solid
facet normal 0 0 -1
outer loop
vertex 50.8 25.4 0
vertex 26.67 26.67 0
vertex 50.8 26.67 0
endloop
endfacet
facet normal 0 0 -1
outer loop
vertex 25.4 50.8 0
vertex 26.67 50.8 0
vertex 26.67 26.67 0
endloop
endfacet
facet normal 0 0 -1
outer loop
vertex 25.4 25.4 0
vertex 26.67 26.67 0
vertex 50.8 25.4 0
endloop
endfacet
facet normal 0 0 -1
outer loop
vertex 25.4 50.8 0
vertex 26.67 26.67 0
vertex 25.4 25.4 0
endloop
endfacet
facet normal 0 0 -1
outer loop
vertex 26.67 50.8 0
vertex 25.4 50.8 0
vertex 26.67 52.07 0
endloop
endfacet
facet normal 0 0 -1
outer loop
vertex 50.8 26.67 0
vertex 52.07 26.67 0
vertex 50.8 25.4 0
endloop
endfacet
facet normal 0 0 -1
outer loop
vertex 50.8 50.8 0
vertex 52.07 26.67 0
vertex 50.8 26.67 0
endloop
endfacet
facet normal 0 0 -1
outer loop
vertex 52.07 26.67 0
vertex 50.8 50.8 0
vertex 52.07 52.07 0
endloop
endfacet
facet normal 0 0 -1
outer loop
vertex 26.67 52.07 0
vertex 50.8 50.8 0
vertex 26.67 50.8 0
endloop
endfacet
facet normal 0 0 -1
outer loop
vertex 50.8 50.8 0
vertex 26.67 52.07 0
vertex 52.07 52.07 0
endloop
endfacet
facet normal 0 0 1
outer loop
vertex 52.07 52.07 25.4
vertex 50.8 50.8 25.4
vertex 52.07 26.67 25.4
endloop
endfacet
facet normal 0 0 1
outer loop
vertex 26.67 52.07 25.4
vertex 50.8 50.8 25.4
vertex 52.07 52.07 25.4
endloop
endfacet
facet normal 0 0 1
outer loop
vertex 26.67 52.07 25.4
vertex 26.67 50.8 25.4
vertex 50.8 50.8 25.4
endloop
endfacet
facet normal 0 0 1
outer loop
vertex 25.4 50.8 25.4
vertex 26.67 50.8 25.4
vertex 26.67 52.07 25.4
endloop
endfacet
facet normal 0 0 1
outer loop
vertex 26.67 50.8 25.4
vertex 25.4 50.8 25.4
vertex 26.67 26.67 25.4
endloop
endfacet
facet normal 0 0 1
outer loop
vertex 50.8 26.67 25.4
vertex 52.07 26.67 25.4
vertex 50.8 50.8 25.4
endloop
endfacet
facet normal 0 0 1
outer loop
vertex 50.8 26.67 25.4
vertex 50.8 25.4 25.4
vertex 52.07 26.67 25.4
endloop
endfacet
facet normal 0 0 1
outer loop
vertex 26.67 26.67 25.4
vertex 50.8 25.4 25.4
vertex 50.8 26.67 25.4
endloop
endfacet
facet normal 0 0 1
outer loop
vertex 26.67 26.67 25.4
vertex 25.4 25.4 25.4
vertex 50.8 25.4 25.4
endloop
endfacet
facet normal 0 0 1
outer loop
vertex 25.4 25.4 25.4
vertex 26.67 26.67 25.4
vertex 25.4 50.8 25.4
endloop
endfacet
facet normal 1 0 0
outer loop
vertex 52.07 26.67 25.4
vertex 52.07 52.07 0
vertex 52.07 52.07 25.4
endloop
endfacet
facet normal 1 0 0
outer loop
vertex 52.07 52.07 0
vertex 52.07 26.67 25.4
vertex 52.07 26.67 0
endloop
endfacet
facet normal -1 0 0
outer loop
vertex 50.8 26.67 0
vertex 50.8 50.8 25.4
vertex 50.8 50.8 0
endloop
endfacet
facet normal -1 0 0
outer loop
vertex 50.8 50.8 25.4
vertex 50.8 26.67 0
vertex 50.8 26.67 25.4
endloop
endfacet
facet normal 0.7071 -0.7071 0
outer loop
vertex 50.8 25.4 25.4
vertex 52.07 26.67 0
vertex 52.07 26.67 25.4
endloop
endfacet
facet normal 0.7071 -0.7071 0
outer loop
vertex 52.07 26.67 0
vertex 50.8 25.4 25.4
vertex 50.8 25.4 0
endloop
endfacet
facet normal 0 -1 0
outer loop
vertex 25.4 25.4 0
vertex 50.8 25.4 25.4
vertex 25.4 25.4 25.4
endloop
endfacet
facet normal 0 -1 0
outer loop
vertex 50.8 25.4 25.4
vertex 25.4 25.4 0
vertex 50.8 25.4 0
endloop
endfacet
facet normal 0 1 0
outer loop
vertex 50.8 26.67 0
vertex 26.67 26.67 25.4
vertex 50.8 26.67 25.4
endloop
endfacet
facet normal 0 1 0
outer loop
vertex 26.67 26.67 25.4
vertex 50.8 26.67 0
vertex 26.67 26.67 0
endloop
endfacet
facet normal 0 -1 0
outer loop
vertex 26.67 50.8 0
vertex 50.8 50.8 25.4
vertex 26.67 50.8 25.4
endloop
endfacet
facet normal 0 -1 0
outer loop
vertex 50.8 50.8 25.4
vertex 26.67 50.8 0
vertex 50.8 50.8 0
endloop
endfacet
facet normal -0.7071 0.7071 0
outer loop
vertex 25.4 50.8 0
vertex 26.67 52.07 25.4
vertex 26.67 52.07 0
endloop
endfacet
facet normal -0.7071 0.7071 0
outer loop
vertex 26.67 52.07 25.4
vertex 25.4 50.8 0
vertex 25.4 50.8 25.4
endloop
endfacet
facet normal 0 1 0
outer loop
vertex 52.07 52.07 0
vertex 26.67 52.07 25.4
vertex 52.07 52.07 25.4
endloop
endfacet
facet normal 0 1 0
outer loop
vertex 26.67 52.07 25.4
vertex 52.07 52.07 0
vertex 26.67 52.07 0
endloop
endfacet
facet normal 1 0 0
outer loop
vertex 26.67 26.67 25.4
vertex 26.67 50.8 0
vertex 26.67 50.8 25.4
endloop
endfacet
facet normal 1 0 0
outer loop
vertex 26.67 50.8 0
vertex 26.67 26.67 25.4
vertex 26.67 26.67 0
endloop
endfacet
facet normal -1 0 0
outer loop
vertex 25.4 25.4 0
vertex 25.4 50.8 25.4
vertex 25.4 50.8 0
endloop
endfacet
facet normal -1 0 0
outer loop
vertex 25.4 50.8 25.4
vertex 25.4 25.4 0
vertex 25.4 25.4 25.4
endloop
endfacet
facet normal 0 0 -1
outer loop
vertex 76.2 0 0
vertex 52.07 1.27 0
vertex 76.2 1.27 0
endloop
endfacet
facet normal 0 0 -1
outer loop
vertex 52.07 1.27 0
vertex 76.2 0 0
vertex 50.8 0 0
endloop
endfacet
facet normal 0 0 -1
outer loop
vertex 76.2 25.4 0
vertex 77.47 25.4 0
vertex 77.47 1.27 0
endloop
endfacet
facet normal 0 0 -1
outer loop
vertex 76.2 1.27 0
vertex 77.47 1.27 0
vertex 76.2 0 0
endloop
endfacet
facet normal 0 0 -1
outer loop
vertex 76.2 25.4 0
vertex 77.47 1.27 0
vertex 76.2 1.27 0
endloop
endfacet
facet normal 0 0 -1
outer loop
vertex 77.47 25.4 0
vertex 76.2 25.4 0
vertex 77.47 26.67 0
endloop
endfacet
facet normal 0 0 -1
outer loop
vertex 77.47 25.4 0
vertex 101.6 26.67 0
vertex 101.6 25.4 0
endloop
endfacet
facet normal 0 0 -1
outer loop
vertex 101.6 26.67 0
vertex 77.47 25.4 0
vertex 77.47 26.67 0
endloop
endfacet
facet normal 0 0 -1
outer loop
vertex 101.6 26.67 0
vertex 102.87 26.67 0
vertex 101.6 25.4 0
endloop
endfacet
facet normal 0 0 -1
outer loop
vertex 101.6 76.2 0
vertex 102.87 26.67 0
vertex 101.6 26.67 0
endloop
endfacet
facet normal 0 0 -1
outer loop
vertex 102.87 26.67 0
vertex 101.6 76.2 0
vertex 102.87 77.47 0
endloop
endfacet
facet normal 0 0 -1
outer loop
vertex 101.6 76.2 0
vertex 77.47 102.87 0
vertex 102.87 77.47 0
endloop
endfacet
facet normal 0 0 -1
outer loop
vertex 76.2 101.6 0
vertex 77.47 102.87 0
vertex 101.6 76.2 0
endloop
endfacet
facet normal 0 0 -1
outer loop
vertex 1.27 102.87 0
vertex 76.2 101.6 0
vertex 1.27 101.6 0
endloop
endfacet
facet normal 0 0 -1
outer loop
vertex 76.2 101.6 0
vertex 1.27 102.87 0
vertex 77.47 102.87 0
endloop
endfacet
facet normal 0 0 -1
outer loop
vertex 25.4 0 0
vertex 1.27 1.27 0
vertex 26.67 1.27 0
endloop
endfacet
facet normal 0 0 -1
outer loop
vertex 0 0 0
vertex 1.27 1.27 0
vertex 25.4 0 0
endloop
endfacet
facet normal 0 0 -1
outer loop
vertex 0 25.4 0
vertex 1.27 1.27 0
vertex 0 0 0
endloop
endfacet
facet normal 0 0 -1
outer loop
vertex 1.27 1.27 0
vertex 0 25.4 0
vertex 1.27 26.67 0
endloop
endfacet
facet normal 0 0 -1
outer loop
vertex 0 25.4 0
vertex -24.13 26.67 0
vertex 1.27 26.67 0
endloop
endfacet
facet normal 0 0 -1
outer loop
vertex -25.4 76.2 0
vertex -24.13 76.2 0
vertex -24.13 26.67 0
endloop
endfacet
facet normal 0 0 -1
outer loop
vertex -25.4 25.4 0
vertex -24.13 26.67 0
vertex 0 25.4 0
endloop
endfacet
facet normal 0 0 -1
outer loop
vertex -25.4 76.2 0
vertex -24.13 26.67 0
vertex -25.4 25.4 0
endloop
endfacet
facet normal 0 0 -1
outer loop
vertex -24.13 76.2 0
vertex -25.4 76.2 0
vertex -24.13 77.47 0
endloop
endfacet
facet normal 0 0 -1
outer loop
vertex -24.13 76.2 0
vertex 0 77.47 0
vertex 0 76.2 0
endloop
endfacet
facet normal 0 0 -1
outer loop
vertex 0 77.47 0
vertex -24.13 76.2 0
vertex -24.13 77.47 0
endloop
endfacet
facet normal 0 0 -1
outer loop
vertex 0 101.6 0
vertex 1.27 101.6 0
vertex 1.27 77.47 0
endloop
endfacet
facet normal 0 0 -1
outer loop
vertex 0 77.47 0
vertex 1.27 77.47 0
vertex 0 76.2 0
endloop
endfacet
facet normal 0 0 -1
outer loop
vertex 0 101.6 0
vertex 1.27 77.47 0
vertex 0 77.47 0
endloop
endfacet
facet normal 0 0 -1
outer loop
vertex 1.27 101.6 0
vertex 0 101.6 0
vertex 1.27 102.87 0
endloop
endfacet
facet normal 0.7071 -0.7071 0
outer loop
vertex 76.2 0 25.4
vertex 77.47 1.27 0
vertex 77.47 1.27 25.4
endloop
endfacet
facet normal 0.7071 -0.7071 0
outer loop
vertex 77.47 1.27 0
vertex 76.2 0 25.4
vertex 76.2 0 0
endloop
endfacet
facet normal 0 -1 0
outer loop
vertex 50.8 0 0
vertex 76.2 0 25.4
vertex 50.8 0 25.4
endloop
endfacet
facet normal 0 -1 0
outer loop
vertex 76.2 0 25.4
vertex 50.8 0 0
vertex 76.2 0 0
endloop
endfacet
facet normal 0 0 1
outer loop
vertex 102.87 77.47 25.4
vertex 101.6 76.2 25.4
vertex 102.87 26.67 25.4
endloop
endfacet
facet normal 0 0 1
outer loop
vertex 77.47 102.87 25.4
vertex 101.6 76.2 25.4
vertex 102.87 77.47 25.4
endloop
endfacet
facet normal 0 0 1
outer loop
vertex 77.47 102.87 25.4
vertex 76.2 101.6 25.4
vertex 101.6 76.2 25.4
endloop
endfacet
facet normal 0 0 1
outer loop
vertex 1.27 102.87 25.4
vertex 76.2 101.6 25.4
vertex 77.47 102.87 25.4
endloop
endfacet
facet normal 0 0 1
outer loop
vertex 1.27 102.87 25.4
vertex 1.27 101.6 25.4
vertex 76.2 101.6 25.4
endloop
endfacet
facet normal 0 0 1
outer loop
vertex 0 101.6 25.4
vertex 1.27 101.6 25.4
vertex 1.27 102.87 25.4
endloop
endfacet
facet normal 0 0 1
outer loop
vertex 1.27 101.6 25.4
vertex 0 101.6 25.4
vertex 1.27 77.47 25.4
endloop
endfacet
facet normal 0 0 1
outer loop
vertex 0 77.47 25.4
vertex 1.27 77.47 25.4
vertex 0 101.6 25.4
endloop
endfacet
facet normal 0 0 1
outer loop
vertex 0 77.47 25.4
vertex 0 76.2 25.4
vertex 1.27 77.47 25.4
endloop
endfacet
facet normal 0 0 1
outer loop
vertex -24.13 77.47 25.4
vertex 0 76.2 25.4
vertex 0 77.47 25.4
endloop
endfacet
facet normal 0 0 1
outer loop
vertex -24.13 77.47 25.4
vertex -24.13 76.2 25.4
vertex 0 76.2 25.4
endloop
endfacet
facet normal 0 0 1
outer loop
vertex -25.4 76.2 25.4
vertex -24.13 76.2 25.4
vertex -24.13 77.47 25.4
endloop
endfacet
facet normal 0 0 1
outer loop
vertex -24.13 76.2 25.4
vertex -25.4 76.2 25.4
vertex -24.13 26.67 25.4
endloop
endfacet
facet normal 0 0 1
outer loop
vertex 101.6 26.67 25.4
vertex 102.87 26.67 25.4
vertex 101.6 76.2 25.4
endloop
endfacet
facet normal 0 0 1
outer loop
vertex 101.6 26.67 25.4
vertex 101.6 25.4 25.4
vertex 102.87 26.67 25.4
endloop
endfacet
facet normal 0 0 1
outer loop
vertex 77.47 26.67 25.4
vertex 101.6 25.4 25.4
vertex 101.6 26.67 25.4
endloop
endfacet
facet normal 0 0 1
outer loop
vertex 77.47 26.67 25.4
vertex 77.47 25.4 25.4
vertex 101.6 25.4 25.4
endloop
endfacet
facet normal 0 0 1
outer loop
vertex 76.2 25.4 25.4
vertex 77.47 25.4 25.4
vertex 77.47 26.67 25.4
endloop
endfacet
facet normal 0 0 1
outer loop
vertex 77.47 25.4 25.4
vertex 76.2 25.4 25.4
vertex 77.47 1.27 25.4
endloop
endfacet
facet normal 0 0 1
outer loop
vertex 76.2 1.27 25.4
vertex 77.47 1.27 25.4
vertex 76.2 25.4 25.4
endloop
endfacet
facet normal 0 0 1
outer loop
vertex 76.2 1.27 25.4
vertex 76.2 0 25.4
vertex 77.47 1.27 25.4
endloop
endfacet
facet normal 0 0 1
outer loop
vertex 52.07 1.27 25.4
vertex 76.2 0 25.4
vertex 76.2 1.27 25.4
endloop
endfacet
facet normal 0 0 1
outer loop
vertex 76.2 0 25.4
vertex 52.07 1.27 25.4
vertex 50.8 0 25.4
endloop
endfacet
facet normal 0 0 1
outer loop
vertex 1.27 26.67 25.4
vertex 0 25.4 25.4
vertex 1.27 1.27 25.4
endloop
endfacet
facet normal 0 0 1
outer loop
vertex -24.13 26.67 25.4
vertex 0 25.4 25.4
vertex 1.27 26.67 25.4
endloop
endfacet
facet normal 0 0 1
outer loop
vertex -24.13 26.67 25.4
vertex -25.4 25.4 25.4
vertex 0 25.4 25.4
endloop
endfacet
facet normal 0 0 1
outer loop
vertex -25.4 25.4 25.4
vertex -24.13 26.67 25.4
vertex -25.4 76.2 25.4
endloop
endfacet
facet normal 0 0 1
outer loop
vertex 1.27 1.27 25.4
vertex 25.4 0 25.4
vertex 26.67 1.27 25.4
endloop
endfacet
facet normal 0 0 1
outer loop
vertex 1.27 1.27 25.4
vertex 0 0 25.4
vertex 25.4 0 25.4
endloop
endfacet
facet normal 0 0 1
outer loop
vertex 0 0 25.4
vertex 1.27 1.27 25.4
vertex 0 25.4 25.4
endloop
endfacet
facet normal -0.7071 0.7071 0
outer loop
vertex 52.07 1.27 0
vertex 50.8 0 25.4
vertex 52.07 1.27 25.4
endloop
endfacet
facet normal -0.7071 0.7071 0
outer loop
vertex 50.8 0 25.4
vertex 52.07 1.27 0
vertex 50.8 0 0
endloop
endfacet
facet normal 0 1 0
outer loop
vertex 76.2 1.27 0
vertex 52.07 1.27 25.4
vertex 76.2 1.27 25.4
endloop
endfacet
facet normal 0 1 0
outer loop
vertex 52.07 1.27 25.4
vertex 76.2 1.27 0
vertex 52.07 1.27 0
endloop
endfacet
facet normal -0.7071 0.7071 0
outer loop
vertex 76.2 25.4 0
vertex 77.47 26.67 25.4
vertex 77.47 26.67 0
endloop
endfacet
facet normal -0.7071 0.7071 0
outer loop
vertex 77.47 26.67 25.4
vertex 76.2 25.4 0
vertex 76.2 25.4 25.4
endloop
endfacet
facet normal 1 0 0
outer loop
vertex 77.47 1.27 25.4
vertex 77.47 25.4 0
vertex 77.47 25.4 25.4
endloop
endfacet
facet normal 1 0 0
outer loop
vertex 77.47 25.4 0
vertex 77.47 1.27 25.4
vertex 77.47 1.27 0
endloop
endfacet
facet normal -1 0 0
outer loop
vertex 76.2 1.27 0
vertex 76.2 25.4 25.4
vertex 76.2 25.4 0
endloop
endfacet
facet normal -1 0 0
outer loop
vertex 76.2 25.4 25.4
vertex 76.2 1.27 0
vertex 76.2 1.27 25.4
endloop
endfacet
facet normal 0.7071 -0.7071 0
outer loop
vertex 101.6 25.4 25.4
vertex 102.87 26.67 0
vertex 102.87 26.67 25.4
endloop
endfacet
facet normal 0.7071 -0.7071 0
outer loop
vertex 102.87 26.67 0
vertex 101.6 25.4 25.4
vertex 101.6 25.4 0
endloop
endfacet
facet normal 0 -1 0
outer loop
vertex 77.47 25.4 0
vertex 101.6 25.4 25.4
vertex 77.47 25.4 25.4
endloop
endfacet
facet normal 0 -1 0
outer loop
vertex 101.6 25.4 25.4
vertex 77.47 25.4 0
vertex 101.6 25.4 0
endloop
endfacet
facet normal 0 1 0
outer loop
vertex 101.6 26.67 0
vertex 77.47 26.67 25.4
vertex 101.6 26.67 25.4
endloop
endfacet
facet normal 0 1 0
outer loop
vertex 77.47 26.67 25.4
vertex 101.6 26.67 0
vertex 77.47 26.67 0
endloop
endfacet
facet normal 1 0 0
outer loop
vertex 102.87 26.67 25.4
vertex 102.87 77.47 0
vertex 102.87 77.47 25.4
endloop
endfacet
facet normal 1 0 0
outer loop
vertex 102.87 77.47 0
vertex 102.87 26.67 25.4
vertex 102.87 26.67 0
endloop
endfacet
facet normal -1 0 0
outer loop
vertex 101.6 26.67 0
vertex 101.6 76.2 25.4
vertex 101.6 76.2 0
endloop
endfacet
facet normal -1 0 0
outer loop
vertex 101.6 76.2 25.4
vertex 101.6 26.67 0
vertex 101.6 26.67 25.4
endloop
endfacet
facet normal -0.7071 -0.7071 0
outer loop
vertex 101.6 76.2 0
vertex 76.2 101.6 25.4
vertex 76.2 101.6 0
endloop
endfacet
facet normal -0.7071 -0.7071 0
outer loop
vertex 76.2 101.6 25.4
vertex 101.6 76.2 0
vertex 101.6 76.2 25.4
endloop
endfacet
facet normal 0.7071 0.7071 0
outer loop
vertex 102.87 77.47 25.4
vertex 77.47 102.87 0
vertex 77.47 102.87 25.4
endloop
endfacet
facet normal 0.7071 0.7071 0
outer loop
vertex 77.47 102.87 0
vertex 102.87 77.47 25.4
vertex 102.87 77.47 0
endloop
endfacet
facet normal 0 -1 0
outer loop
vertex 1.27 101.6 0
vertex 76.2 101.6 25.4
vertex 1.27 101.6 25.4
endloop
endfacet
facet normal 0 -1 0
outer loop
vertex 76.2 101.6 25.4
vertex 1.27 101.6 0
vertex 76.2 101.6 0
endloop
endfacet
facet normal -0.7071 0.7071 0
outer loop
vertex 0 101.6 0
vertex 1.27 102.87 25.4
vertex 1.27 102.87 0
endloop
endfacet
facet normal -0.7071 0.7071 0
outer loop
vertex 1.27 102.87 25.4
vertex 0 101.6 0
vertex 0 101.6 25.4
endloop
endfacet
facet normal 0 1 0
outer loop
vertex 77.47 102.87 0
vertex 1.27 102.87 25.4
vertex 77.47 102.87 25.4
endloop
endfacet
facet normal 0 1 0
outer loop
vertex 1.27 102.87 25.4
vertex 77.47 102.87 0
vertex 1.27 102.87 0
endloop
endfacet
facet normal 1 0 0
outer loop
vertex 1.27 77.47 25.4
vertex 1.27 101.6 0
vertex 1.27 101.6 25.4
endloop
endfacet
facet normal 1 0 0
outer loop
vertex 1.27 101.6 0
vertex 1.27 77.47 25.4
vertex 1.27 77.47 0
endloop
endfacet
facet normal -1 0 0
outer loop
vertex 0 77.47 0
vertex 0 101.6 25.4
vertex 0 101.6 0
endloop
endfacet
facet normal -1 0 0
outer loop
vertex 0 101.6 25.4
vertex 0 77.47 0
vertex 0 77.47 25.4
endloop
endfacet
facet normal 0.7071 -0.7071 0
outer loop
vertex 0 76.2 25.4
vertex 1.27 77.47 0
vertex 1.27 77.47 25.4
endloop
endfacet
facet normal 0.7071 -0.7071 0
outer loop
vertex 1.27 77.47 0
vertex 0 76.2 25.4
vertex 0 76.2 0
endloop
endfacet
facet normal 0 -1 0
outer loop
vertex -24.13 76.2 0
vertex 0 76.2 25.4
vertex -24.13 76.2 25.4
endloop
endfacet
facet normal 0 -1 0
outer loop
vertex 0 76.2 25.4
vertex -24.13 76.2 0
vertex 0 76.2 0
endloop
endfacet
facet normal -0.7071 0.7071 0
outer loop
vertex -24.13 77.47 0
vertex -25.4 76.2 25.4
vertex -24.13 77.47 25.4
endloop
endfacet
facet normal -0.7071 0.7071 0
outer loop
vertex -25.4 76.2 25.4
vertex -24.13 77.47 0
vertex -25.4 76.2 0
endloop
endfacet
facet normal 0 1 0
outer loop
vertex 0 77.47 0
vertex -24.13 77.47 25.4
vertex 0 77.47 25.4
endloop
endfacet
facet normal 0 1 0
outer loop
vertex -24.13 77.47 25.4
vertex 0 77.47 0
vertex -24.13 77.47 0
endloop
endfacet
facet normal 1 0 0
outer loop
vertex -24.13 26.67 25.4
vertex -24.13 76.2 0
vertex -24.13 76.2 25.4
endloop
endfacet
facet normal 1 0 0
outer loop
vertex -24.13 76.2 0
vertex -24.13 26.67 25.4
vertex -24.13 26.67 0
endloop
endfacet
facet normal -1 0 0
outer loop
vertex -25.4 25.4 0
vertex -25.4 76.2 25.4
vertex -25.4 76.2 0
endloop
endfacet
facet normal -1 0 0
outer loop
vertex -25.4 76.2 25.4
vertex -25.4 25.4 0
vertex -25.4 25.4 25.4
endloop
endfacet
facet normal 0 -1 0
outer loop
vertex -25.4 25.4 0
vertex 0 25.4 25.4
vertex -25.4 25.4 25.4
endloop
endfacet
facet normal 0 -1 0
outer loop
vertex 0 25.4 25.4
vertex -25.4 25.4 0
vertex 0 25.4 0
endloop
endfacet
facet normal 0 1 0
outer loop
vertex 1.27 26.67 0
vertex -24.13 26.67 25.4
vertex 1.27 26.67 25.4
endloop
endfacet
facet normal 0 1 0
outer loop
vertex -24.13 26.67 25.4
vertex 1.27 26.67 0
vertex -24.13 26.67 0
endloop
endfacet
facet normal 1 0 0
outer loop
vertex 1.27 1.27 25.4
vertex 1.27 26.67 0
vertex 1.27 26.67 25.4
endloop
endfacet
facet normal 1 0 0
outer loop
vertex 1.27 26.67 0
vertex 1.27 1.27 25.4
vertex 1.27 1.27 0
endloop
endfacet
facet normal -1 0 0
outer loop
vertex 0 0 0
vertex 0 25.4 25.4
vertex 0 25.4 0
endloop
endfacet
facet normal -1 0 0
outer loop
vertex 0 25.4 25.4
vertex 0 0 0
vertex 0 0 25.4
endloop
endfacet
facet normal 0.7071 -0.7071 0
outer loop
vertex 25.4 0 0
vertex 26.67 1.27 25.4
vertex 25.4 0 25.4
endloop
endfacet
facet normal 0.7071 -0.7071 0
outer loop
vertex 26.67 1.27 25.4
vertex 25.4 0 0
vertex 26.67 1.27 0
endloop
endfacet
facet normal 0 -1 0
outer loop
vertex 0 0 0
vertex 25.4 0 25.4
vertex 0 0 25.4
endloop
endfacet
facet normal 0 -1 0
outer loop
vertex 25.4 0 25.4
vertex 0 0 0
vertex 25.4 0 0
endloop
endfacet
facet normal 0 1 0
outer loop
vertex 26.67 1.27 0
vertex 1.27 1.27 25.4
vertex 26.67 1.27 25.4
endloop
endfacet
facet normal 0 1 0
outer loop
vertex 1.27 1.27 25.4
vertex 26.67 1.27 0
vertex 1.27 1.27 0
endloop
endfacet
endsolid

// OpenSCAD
//CUSTOMIZER VARIABLES

//	This should be a small number relative to your height of wall
width_Of_wall = .05;

//How tall do you want this
height_Of_wall = 1;

//	Vector path of wall, (wall thickness is only right angles for now), to generate a seperate path make a null/blank entry in your vector of order pairs, please note these are in whatever unit you selected earlier.
cords_Of_wall = [[1,0],[0,0],[0,1],[-1,1],[-1,3],[0,3],[0,4],[3,4],[4,3],[4,1],[3,1],[3,0],[2,0],[,],[1,1],[1,2],[2,2],[2,1],[1,1]];

//Basically are you using american units or real units
units_entered = 25.4;//[1:mm, 10:cm, 1000:meter, 25.4:inch, 304.8:foot]

//default is mm for most printers
desired_units_for_output = 1;//[1:mm, .1:cm, 0.001:meter, 0.0393701:inch, 0.00328084:foot]

//	This option will not appear because of the *1
//CUSTOMIZER VARIABLES END

width_of_wall = width_Of_wall;
unit_conversion_factor = units_entered*desired_units_for_output;
height_of_wall = height_Of_wall*unit_conversion_factor;

module make_wall_segments(cords = cords_Of_wall, number_your_on,units = 25.4) {
	/*number_your_on works such that when it equals 1, that is the begining.
		(yes I am one of those people who belives arrays 
		should have started with 1 instead of 0)
	*/
	point1 = cords[number_your_on-1]*unit_conversion_factor;
	point2 = cords[number_your_on]*unit_conversion_factor;
	point3 = [point2[0]+width_Of_wall*unit_conversion_factor,point2[1]+width_Of_wall*unit_conversion_factor];
	point4 = [point1[0]+width_Of_wall*unit_conversion_factor,point1[1]+width_Of_wall*unit_conversion_factor];
	
	linear_extrude(height = height_of_wall){
			polygon([point1,point2,point3,point4]);
		}
		if(number_your_on < len(cords)){
			make_wall_segments(cords = cords_Of_wall,number_your_on = number_your_on+1, units = unit_conversion_factor);
		}
}

make_wall_segments(cords = cords_Of_wall,number_your_on = 1, units = unit_conversion_factor);
